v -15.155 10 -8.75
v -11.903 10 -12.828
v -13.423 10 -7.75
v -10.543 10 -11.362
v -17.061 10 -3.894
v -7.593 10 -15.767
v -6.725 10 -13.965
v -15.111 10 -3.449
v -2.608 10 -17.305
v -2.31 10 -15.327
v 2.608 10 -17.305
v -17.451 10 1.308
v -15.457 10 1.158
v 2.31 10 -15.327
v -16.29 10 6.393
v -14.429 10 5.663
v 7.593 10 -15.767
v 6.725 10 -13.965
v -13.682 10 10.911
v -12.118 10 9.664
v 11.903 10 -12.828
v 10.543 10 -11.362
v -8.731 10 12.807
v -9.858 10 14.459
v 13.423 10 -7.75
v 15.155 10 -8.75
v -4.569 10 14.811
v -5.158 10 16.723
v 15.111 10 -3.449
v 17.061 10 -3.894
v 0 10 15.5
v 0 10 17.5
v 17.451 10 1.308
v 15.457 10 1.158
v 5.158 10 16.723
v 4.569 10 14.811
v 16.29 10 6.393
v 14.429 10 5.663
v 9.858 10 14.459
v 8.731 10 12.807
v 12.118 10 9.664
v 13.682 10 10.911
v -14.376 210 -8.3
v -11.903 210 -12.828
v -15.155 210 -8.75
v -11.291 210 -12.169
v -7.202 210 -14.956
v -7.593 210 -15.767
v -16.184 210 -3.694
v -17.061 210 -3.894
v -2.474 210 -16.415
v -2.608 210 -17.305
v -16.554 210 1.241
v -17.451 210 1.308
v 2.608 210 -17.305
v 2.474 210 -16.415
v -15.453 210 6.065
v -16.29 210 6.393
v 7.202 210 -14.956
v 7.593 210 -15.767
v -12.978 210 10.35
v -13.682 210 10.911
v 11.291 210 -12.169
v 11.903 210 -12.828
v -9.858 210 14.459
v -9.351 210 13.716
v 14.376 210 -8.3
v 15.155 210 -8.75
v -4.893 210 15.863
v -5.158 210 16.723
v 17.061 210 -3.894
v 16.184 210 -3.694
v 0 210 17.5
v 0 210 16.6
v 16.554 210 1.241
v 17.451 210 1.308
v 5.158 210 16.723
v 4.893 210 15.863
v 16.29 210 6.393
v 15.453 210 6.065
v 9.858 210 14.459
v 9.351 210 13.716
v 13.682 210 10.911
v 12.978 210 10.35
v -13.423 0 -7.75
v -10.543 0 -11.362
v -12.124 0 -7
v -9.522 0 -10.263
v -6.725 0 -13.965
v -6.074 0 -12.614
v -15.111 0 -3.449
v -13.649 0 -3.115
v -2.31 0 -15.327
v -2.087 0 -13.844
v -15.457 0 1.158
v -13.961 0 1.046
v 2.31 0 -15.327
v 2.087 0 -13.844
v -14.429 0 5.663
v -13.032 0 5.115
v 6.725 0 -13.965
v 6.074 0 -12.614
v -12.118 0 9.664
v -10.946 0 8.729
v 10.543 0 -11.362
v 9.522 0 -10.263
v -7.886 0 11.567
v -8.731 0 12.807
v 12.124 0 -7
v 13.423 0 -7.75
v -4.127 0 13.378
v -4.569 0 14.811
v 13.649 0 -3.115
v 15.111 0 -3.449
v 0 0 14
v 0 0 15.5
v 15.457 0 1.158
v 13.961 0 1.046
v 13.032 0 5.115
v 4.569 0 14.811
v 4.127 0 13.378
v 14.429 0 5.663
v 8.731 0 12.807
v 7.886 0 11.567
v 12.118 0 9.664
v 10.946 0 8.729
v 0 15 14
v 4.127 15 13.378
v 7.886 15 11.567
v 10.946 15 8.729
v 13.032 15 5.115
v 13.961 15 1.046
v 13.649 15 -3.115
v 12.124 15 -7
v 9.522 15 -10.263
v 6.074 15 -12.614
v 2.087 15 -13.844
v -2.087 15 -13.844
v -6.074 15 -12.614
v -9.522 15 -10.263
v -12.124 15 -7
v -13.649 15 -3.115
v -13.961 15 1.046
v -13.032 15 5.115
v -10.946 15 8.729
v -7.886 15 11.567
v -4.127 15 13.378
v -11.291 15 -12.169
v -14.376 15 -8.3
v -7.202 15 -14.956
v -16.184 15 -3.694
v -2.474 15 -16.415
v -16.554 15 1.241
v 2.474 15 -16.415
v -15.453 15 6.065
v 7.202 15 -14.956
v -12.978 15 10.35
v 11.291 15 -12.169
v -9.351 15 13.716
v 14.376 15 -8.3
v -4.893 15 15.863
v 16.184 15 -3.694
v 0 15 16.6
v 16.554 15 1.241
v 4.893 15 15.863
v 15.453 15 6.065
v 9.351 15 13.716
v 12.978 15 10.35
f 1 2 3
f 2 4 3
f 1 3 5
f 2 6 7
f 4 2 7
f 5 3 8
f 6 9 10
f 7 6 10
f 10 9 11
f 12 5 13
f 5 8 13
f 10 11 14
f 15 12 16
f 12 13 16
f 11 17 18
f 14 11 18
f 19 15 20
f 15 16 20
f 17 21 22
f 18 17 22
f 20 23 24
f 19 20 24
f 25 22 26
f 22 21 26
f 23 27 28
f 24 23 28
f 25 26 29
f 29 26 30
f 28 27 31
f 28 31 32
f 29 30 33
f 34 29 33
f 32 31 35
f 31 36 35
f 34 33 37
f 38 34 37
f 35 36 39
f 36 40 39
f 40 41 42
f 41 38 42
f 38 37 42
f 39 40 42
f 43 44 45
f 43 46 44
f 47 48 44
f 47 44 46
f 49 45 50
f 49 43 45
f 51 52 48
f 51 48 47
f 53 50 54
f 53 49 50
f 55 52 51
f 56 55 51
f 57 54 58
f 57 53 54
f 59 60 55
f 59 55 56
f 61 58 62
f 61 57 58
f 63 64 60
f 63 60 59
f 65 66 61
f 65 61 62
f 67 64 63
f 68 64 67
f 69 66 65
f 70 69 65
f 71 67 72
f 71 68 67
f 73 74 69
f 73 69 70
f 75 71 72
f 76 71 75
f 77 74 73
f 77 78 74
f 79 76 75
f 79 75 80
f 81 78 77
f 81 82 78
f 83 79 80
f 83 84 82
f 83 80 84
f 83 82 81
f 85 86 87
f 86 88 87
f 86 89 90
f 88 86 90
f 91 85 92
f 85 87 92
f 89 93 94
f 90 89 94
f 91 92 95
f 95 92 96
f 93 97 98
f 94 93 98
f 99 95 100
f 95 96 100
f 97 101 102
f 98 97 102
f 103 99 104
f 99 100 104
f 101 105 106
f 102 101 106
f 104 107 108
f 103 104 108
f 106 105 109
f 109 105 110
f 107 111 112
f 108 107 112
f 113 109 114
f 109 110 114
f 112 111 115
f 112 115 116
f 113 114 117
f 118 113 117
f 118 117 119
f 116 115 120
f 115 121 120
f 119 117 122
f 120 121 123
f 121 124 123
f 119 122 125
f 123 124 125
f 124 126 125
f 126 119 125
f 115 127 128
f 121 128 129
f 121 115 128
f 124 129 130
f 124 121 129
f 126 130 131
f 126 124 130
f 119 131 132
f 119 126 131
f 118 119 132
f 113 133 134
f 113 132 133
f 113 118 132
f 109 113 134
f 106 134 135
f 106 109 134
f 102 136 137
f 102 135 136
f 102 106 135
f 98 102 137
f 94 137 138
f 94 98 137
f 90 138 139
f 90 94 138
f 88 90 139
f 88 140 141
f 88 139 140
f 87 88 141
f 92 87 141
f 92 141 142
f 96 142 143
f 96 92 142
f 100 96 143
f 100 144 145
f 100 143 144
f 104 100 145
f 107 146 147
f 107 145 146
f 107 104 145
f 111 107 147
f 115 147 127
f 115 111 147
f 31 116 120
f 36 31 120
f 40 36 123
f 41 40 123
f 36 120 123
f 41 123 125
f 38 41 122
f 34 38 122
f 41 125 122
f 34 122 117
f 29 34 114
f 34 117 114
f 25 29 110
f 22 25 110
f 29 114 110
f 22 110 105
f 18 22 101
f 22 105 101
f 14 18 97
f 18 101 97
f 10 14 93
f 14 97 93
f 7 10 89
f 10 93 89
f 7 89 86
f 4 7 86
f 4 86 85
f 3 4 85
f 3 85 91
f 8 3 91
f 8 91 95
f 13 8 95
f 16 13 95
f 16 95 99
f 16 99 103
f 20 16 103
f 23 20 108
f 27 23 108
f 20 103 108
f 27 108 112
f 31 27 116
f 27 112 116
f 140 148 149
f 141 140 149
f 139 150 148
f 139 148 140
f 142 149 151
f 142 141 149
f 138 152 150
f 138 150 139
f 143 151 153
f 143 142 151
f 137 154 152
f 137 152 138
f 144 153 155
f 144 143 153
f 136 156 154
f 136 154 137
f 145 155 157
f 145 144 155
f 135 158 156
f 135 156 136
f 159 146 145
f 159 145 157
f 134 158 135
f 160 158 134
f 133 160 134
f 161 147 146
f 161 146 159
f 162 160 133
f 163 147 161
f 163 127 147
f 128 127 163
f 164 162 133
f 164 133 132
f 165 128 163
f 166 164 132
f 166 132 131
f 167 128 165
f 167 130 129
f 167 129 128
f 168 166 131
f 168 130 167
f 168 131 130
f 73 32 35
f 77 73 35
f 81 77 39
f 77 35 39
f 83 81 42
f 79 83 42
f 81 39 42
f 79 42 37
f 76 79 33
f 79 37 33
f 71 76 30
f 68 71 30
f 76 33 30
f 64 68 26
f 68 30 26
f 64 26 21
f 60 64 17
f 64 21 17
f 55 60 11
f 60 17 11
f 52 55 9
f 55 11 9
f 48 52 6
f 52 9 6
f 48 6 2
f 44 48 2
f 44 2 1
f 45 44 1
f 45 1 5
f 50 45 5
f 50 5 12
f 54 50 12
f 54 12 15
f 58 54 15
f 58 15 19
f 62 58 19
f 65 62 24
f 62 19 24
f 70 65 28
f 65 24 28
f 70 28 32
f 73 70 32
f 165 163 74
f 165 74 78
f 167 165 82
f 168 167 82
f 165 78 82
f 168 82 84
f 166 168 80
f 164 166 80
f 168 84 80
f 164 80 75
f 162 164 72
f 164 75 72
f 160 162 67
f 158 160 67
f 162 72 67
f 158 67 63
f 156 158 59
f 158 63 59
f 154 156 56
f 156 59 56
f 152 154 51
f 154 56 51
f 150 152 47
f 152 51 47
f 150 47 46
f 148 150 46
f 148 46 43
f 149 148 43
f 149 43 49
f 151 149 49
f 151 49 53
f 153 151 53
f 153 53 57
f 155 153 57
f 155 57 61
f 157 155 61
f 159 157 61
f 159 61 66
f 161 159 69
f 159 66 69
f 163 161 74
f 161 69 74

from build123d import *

# Parameters (mm, degrees)
SKETCH1_R           = 15.5
SKETCH1_R_2         = 14
BOSS_EXTRUDE1_DEPTH = 10
SKETCH4_R           = 17.5
SKETCH4_R_2         = 14
BOSS_EXTRUDE2_DEPTH = 200
SKETCH5_R           = 16.6
CUT_EXTRUDE2_DEPTH  = 195


with BuildPart() as part:
    # Sketch1 → Boss-Extrude1 (new body)
    with BuildSketch(Plane(origin=(0, 0, 0), x_dir=(1, 0, 0), z_dir=(0, 1, 0))):
        with Locations(Location((0, 0, 0), (0, 0, 270))):
            Circle(SKETCH1_R)
        with Locations(Location((0, 0, 0), (0, 0, 270))):
            Circle(SKETCH1_R_2, mode=Mode.SUBTRACT)
    extrude(amount=BOSS_EXTRUDE1_DEPTH)

    # Sketch4 → Boss-Extrude2 (add)
    with BuildSketch(Plane(origin=(0, 10, 0), x_dir=(1, 0, 0), z_dir=(0, 1, 0))):
        with Locations(Location((0, 0, 0), (0, 0, 270))):
            Circle(SKETCH4_R)
        with Locations(Location((0, 0, 0), (0, 0, 270))):
            Circle(SKETCH4_R_2, mode=Mode.SUBTRACT)
    extrude(amount=BOSS_EXTRUDE2_DEPTH)

    # Sketch5 → Cut-Extrude2 (cut)
    with BuildSketch(Plane(origin=(0, 210, 0), x_dir=(1, 0, 0), z_dir=(0, 1, 0))):
        with Locations(Location((0, 0, 0), (0, 0, 270))):
            Circle(SKETCH5_R)
    extrude(amount=-CUT_EXTRUDE2_DEPTH, mode=Mode.SUBTRACT)


solid = part.part
